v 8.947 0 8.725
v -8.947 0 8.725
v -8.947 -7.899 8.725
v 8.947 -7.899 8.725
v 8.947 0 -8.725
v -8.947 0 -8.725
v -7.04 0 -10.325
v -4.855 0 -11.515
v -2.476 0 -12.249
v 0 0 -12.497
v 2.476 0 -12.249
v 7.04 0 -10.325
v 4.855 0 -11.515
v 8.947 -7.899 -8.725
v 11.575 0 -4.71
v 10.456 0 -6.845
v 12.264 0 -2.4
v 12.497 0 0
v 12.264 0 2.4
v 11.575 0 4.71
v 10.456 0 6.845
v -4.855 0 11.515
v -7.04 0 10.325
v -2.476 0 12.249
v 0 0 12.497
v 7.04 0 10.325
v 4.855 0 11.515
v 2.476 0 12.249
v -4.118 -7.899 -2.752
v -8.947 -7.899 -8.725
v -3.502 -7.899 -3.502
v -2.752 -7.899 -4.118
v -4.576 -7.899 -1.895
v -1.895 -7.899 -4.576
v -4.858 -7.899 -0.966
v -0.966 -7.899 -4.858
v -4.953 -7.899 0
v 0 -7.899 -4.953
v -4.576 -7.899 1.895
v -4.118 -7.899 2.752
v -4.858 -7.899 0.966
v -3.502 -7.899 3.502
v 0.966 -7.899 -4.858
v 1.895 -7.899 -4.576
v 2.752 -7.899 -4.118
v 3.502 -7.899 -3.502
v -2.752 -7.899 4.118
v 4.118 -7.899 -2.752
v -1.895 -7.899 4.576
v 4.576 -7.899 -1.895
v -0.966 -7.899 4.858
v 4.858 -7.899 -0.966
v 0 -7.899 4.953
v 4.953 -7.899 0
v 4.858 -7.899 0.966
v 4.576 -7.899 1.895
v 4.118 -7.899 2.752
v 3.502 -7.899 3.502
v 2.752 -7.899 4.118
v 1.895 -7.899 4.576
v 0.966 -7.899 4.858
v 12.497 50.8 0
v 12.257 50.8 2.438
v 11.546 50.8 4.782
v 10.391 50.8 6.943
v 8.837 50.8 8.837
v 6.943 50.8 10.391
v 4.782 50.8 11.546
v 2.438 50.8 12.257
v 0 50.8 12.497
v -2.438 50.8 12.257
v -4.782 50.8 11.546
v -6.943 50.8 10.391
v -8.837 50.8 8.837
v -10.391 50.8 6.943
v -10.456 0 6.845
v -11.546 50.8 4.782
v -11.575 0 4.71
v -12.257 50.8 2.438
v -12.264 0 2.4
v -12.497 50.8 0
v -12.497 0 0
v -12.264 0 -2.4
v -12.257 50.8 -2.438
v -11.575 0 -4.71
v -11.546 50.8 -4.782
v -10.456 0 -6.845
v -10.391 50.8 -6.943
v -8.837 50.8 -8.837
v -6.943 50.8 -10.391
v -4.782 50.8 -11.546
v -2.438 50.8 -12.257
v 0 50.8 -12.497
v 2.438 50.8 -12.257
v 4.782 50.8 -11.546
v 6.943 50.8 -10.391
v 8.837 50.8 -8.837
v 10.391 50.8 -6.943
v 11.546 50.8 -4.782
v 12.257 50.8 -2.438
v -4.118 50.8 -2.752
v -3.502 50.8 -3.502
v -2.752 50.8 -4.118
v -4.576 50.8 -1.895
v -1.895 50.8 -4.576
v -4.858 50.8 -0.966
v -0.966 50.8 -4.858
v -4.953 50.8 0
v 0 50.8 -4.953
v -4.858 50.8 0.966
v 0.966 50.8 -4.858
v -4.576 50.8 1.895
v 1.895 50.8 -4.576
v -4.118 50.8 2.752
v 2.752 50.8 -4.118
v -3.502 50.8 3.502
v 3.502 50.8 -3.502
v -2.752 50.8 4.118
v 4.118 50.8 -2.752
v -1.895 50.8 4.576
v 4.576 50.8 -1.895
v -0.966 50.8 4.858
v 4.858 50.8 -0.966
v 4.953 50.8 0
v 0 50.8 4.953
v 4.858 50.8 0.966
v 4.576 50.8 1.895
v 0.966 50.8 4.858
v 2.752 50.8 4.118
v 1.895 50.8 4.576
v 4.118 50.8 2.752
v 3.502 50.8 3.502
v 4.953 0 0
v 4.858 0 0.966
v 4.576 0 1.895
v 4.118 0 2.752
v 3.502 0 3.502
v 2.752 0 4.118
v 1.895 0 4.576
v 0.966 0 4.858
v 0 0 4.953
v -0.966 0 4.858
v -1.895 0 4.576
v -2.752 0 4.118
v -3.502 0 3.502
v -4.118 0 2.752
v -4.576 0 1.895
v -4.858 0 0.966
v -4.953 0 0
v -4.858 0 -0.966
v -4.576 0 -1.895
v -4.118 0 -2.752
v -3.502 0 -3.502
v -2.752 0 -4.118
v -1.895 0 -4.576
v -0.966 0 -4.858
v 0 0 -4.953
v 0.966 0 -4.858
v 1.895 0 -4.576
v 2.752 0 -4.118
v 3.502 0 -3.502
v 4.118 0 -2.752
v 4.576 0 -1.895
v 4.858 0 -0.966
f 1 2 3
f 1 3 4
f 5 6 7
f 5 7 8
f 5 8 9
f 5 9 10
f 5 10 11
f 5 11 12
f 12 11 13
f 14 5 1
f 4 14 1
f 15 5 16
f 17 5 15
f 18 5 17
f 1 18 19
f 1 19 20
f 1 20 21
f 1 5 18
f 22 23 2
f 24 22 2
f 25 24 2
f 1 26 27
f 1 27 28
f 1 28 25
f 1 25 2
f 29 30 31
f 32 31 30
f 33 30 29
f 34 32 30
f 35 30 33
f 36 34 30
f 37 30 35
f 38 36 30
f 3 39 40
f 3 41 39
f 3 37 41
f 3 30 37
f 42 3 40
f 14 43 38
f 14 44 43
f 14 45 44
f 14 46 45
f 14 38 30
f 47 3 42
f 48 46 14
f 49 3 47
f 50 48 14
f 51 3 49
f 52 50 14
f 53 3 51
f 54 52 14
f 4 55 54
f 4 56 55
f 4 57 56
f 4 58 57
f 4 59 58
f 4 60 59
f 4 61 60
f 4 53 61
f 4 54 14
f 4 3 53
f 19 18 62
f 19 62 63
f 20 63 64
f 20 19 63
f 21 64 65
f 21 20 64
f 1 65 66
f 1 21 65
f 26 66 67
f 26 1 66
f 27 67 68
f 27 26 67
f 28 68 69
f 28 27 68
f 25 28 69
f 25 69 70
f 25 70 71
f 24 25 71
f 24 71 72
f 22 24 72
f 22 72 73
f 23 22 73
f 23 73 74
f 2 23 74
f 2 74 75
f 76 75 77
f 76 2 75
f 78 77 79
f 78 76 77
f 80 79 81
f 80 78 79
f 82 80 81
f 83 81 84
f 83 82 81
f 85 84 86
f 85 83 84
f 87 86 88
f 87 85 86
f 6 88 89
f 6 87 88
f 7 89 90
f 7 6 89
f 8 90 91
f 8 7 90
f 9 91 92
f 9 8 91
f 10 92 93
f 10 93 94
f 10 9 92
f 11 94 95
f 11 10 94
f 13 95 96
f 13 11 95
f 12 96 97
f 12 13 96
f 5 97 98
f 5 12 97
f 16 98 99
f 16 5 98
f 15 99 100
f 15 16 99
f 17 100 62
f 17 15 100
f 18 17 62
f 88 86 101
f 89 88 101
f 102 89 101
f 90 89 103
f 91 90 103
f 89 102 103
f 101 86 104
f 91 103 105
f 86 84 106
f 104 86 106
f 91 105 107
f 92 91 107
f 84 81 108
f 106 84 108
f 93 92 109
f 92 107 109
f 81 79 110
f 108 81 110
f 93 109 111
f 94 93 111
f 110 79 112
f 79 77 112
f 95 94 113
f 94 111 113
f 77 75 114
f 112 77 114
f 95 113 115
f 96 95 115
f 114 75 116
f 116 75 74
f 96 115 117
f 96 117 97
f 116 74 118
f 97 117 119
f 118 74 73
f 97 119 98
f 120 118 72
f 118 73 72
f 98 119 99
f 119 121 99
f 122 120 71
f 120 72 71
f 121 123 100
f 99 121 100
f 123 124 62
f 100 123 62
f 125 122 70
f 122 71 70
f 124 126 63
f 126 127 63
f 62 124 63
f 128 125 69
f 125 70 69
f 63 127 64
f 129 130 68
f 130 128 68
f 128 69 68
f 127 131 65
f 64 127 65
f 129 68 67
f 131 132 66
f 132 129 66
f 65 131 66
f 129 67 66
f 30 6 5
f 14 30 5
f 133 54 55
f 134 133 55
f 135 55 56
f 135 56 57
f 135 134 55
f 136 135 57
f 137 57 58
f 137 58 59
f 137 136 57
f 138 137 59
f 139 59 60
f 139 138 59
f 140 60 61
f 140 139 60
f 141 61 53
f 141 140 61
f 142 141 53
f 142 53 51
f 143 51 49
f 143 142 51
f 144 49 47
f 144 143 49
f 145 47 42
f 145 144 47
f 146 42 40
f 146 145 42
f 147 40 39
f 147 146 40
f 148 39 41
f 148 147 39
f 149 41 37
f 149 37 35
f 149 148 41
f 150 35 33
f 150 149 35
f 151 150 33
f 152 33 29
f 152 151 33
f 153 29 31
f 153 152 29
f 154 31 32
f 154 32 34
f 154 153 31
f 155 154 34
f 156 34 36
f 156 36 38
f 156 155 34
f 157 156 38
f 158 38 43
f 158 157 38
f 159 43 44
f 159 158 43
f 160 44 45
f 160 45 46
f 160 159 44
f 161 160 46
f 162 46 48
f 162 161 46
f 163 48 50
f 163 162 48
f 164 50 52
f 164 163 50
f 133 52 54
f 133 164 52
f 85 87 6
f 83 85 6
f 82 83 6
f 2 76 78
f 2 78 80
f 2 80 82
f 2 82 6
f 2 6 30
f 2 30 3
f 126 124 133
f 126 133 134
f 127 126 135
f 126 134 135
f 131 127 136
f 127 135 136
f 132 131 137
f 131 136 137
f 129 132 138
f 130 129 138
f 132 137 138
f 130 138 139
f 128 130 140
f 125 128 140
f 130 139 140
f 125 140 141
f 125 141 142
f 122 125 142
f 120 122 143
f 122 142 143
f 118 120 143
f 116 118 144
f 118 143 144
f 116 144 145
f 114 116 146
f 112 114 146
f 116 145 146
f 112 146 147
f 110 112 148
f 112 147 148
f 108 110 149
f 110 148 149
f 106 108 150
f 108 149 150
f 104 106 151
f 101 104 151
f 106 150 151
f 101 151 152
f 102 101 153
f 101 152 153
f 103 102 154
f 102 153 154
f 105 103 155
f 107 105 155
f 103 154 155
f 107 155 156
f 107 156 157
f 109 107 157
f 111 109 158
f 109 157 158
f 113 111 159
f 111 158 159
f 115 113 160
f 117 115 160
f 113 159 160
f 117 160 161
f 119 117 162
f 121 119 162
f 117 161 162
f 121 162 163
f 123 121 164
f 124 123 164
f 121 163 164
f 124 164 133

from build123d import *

# Parameters (mm, degrees)
F0_W      = 17.8937
F0_H      = 17.4498
F0_R      = 4.953
F1_DEPTH  = 7.8994
F2_R      = 12.4968
F3_DEPTH  = 50.8
F3_FACE_R = 4.953
F4_DEPTH  = 50.8


with BuildPart() as f1:
    # F0 (on Front) → F1 (new body)
    with BuildSketch(Plane.XZ):
        Rectangle(F0_W, F0_H)
        Circle(F0_R, mode=Mode.SUBTRACT)
    extrude(amount=F1_DEPTH)

    # F2 (on Front) → F3 (join)
    with BuildSketch(Plane.XZ):
        Circle(F2_R)
    extrude(amount=-F3_DEPTH)

    # F3_face (on face) → F4 (cut)
    with BuildSketch(Plane.XZ):
        Circle(F3_FACE_R)
    extrude(amount=-F4_DEPTH, mode=Mode.SUBTRACT)


solid = f1.part
